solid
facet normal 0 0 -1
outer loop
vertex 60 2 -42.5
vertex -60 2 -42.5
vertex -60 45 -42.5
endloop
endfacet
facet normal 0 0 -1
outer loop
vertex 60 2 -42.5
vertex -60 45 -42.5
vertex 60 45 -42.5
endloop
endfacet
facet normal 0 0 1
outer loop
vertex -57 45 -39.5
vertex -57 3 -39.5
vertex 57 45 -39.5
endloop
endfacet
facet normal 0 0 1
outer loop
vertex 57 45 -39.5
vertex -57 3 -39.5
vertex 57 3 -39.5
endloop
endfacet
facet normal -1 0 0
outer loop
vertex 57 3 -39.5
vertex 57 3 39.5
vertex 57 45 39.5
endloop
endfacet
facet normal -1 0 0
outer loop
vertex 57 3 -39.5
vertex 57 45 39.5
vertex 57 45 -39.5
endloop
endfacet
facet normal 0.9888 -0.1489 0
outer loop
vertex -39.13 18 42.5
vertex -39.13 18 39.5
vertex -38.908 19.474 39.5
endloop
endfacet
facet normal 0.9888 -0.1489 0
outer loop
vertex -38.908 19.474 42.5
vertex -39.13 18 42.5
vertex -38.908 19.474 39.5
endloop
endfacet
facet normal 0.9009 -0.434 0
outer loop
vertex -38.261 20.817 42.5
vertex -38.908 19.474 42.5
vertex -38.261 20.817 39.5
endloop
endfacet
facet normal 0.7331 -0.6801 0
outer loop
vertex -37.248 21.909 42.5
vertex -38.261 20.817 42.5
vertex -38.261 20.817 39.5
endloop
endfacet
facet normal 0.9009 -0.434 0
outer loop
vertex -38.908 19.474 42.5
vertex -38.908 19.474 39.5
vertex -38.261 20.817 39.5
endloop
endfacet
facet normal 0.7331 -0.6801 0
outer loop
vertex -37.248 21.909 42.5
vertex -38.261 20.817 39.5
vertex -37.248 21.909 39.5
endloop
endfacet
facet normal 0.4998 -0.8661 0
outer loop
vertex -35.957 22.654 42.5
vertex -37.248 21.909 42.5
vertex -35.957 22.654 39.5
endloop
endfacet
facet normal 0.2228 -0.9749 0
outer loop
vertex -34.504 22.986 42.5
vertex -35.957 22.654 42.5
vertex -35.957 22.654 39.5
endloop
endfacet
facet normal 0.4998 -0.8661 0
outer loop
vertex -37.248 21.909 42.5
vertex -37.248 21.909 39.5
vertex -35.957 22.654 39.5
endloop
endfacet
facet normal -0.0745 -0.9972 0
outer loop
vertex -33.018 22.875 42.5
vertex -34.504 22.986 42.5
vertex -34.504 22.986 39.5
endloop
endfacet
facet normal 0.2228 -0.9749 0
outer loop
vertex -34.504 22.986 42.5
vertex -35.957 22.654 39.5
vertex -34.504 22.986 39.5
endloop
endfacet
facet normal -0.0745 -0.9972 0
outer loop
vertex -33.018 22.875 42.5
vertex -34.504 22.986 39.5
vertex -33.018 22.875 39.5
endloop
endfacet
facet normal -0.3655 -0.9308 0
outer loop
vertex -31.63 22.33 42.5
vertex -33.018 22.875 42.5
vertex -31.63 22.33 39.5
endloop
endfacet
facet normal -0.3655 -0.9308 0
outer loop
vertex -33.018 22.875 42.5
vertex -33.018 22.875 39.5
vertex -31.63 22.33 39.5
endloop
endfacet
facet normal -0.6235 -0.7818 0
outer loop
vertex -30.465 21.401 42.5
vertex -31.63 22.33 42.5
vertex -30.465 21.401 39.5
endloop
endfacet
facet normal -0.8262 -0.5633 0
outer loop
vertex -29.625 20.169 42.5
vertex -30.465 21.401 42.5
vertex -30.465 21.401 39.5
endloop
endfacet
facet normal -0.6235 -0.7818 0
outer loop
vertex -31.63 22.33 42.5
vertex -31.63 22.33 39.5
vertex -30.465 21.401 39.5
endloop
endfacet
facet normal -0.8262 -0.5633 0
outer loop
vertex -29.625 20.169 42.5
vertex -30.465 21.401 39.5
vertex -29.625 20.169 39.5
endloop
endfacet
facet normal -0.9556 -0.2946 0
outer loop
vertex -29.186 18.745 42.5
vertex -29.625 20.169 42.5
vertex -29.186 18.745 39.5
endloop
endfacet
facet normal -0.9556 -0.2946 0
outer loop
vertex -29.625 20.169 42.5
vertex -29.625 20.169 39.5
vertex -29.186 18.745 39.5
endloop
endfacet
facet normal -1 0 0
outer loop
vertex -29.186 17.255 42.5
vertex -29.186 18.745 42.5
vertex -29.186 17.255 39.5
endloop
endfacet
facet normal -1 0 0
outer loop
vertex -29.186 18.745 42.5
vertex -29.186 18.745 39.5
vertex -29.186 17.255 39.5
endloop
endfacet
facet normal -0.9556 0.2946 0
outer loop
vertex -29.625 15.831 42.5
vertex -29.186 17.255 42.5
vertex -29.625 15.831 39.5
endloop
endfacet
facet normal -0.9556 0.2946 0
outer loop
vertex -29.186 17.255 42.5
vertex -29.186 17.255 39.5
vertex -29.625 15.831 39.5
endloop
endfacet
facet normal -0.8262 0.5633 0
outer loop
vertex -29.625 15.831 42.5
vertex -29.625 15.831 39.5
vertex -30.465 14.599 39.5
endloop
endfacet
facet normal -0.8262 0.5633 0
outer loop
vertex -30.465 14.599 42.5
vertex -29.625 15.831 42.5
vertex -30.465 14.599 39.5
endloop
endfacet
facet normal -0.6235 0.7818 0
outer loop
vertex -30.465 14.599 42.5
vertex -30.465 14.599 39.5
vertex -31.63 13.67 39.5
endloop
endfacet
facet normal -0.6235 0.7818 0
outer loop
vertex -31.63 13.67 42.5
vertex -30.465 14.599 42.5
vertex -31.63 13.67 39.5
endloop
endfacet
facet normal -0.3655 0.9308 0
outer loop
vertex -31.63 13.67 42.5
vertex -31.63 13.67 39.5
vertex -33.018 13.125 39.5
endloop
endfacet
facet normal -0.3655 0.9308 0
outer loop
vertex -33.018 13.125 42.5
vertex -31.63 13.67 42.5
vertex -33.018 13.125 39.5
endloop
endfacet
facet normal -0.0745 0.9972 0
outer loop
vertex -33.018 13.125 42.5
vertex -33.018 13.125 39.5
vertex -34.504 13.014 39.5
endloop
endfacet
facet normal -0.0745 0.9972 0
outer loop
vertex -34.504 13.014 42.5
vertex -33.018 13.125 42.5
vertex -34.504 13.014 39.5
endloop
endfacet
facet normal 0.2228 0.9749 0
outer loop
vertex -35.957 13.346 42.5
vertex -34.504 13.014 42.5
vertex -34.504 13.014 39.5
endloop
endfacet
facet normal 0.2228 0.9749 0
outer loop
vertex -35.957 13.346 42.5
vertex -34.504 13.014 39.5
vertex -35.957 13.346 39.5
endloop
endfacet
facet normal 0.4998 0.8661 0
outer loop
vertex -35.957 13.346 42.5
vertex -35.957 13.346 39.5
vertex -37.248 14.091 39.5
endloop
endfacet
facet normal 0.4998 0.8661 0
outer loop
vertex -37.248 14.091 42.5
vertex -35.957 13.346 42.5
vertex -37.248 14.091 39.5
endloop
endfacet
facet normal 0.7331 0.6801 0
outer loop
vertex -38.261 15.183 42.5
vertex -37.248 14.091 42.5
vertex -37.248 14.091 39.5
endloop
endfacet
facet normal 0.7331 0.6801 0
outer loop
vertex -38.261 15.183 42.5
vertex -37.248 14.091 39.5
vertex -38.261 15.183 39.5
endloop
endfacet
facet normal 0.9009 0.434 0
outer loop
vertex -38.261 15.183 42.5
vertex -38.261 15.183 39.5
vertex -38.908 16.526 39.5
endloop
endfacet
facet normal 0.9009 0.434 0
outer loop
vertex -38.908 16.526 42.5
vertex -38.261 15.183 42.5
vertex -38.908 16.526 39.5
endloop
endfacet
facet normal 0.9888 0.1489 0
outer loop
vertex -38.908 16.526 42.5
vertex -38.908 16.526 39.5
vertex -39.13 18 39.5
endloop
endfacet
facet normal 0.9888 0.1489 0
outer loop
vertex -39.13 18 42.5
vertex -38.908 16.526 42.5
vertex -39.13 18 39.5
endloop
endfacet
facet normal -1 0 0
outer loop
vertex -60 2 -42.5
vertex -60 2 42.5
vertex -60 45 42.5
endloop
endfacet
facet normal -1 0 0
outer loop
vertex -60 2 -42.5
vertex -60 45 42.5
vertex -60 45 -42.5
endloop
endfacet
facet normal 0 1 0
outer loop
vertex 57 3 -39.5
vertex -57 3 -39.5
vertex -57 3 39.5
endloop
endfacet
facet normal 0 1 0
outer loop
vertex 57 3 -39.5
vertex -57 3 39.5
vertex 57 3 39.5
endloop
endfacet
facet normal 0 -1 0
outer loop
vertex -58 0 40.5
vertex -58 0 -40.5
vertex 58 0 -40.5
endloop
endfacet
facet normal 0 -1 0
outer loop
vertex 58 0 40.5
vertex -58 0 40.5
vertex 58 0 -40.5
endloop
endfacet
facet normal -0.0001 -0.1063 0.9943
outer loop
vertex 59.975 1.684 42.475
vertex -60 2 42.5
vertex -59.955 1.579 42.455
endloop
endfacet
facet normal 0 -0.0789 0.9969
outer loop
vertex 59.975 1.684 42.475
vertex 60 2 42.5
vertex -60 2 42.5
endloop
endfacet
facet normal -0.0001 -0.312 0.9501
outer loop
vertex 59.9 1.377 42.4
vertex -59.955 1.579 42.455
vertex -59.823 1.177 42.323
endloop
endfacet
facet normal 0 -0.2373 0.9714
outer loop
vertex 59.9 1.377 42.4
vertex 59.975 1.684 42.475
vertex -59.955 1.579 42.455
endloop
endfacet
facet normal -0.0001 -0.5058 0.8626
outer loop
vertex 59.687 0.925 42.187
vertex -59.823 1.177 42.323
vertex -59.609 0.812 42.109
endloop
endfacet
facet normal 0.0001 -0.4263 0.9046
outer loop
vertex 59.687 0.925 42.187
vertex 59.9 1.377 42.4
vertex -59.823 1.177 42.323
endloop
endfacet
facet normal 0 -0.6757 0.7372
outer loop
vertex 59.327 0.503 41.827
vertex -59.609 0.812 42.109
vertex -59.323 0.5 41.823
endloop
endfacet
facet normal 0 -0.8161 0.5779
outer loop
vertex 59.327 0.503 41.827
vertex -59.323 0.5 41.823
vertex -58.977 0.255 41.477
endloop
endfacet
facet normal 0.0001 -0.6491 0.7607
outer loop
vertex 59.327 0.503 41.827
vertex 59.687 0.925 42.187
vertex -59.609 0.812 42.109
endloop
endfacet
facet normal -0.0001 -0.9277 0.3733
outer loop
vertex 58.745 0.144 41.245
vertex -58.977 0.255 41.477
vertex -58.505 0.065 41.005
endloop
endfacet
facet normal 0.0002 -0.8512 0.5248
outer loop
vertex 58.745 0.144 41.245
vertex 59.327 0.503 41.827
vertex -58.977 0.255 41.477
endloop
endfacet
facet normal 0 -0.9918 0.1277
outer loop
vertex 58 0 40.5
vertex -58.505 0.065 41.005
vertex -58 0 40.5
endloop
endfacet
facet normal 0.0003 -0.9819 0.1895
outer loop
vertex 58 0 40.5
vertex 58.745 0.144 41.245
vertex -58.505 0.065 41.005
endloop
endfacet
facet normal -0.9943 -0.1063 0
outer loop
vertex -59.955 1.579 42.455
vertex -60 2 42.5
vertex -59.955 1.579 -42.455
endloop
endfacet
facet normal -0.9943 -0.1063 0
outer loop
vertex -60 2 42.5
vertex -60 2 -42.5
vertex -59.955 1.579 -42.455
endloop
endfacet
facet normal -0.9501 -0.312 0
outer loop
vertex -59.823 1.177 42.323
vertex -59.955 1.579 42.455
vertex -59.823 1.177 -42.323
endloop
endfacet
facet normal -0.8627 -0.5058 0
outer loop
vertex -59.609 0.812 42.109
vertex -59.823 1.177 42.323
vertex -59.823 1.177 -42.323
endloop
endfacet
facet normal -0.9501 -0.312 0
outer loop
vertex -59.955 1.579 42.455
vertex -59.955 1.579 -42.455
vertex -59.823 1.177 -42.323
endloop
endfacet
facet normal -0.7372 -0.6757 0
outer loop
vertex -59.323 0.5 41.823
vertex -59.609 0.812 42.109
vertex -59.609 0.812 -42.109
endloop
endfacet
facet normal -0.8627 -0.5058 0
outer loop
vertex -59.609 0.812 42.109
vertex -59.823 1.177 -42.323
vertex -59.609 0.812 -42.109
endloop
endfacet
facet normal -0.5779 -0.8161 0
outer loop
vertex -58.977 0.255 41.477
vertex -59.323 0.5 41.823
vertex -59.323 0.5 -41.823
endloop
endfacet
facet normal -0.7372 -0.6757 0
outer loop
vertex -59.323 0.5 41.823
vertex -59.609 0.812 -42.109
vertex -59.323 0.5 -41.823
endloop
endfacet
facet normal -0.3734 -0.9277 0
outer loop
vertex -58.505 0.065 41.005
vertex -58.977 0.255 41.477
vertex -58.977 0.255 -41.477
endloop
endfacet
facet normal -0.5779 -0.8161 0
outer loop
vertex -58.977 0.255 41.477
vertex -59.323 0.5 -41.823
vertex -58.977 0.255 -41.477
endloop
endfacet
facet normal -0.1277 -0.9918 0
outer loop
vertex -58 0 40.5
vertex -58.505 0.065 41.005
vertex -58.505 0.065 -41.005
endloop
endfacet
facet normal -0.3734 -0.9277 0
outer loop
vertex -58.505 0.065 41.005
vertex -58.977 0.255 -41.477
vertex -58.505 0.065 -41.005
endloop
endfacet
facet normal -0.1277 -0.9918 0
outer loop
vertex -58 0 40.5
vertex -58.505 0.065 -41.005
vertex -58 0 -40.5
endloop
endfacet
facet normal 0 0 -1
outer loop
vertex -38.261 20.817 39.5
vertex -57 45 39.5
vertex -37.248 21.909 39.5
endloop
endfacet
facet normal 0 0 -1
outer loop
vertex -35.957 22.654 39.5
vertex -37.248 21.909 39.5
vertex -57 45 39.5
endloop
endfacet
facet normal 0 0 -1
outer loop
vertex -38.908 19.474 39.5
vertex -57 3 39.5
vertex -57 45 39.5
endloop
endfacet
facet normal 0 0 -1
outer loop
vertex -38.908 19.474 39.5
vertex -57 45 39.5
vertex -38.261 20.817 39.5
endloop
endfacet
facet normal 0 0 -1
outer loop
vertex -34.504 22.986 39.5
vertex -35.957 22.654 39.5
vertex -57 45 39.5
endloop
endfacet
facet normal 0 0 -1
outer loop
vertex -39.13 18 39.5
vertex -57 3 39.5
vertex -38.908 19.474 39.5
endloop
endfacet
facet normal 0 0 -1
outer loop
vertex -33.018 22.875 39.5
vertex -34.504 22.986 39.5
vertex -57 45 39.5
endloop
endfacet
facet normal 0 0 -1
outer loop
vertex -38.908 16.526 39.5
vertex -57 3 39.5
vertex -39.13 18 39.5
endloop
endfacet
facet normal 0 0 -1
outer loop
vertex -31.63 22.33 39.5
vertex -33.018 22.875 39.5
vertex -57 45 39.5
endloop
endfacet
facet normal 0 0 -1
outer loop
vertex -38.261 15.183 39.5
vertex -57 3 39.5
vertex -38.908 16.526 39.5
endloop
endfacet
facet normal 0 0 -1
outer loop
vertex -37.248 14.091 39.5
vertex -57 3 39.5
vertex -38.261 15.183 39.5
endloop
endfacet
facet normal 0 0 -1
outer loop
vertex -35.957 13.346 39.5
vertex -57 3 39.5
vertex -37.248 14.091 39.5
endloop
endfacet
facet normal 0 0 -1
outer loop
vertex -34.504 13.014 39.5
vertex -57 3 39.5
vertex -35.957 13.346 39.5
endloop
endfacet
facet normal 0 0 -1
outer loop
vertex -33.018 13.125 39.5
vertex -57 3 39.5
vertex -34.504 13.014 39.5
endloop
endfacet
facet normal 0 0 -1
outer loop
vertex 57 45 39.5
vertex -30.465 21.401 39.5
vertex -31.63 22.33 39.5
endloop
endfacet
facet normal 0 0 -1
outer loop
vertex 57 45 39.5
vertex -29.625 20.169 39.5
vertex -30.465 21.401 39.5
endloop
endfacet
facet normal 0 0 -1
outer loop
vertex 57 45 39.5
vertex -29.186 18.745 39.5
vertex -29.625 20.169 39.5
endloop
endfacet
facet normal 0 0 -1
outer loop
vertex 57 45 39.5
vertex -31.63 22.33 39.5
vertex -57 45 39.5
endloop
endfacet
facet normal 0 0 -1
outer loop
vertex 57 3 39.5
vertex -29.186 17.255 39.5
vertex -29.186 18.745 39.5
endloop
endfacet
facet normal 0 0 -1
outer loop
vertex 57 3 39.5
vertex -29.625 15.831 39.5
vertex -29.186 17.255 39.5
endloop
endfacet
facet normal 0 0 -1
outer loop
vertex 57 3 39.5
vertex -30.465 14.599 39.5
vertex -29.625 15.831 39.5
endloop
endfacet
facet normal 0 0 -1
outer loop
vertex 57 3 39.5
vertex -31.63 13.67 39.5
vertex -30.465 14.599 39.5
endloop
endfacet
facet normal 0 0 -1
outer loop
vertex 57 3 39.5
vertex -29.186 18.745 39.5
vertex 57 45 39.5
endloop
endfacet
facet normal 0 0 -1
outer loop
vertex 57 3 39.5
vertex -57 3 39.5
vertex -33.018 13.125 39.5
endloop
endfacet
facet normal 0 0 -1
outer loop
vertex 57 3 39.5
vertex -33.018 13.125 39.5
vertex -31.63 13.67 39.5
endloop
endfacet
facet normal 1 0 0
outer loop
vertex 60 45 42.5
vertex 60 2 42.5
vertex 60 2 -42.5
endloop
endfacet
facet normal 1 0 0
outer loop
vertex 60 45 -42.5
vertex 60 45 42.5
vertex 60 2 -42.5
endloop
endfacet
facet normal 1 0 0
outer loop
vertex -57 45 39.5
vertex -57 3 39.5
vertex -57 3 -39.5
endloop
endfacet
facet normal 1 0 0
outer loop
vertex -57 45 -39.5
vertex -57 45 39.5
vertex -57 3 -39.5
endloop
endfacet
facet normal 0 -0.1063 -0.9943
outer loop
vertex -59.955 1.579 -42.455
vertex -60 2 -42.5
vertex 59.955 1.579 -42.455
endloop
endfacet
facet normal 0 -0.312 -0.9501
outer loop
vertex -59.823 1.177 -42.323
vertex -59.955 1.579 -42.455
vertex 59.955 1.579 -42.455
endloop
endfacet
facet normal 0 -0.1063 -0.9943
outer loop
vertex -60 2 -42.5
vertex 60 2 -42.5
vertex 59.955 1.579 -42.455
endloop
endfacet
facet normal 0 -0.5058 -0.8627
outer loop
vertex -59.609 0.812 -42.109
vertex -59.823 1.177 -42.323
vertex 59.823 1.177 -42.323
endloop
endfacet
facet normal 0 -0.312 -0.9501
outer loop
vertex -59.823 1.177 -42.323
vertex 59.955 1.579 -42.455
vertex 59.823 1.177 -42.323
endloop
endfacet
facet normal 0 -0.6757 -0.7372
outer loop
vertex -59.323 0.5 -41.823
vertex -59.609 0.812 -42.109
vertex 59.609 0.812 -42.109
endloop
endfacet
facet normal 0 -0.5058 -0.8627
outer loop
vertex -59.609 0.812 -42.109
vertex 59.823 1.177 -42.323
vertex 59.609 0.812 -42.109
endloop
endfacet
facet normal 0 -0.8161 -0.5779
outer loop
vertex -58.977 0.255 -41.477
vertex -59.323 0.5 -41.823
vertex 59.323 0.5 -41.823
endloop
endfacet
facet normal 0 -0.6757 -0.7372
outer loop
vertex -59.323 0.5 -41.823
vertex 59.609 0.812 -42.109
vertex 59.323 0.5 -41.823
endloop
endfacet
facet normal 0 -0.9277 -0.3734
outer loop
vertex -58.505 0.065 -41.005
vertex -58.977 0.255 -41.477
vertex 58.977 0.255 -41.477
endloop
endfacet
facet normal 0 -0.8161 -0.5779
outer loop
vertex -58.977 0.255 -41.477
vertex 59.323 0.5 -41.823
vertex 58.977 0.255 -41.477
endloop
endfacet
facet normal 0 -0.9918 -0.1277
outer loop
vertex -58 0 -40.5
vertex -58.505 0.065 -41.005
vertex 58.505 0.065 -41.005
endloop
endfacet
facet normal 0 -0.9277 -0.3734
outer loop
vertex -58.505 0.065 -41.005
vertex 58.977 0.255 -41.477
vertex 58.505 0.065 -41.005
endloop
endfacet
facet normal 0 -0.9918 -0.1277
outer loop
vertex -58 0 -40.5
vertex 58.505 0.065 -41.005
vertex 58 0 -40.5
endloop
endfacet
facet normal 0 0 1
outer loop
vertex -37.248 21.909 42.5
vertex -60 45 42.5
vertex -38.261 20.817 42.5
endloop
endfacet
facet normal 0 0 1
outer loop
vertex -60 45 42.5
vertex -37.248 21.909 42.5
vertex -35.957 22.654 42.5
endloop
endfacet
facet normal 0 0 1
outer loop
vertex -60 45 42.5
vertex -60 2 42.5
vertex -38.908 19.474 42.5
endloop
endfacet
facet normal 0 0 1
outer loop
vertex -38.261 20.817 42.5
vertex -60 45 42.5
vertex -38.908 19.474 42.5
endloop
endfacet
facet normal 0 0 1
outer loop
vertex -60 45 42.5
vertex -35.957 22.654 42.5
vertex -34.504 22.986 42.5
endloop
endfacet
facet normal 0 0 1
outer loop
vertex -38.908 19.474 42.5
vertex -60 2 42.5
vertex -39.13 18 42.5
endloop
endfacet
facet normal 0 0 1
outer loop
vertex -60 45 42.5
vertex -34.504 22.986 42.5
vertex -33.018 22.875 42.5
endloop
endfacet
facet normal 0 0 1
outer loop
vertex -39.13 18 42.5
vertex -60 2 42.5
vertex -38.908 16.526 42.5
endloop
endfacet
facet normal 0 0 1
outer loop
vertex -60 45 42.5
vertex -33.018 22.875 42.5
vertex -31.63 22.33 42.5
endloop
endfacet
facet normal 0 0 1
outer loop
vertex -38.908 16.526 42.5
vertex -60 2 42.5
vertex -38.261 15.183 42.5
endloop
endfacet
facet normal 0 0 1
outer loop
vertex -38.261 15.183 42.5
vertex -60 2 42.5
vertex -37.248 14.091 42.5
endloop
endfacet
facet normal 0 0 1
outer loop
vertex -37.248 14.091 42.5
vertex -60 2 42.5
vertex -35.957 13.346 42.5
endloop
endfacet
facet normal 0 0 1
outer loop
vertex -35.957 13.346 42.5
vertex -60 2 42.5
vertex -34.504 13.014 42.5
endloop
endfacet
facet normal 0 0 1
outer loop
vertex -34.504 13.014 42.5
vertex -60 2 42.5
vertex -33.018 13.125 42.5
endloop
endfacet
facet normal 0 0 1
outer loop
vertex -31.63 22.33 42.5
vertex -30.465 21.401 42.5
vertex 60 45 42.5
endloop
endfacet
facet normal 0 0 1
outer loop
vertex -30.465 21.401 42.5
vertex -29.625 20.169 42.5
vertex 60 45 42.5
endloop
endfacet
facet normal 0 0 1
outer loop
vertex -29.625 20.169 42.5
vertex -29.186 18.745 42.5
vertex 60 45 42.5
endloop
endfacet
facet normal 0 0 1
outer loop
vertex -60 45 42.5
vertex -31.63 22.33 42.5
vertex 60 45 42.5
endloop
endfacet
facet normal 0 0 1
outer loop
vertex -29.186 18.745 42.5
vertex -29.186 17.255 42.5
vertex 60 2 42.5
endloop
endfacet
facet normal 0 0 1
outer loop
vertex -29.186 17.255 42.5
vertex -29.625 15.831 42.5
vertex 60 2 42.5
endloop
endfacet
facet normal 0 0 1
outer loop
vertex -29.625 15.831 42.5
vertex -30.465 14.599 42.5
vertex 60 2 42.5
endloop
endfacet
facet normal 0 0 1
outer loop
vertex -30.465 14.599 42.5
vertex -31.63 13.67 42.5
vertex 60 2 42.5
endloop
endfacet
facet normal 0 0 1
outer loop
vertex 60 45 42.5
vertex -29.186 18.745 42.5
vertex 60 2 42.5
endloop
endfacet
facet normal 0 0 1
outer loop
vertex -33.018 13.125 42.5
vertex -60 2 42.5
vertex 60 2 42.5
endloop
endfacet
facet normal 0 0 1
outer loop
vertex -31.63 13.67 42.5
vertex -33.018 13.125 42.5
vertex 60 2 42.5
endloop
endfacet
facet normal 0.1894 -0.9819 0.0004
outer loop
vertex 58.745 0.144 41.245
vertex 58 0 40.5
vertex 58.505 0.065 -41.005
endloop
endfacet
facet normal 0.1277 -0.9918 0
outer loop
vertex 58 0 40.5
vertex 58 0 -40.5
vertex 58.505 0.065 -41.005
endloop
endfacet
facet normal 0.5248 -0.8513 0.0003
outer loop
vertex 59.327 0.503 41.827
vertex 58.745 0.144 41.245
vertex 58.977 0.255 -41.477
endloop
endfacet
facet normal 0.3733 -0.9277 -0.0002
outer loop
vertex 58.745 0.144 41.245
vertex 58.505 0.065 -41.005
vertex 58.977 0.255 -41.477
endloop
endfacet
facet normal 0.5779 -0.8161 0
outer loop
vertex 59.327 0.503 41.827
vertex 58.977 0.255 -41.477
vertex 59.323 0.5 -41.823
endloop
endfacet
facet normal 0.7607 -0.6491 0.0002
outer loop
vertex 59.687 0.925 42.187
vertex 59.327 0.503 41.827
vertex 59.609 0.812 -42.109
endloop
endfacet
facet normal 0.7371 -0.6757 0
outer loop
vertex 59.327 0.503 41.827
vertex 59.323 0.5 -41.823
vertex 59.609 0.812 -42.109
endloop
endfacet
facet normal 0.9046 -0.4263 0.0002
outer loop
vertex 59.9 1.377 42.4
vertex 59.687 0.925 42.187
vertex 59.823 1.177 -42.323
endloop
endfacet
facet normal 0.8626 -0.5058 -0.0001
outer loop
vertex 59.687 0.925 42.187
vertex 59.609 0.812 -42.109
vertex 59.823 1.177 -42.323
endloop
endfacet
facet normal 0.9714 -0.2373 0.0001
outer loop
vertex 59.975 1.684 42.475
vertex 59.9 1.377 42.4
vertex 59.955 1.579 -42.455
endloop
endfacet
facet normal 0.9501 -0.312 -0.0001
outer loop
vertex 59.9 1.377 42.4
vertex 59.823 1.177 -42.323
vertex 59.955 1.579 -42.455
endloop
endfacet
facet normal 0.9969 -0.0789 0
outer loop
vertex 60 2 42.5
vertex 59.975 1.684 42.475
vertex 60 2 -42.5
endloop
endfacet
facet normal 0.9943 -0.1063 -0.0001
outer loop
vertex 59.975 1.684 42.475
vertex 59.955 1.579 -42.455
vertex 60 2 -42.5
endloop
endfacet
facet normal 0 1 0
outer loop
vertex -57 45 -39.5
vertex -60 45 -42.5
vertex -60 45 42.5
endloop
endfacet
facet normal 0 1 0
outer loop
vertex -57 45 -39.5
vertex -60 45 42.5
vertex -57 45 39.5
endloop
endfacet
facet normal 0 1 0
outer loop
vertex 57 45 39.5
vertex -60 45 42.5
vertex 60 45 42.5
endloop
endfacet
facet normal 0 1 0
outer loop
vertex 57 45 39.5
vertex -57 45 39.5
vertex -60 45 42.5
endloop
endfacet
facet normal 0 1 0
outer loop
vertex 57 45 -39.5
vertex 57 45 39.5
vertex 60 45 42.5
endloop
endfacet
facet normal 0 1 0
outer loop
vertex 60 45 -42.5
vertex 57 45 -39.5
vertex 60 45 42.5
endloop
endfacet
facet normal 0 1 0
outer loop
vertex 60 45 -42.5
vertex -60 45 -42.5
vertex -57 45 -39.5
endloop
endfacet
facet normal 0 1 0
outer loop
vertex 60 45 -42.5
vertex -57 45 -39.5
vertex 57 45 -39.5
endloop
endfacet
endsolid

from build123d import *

# Parameters (mm, degrees)
SKETCH1_W           = 120
SKETCH1_H           = 85
BOSS_EXTRUDE1_DEPTH = 45
SHELL1_T            = -3
SKETCH5_R           = 5
CUT_EXTRUDE2_DEPTH  = 45
FILLET1_R           = 2


with BuildPart() as part:
    # Sketch1 → Boss-Extrude1 (new body)
    with BuildSketch(Plane(origin=(0, 0, 0), x_dir=(1, 0, 0), z_dir=(0, 1, 0))):
        Rectangle(SKETCH1_W, SKETCH1_H)
    extrude(amount=BOSS_EXTRUDE1_DEPTH)

    # Shell1
    shell1_openings = [part.faces().sort_by_distance(p)[0] for p in [
        (0, 45, 0),
    ]]
    offset(amount=SHELL1_T, openings=shell1_openings, kind=Kind.INTERSECTION)

    # Sketch5 → Cut-Extrude2 (cut)
    with BuildSketch(Plane(origin=(0, 0, 39.5), x_dir=(-1, 0, 0), z_dir=(0, 0, -1))):
        with Locations((34.130287034, 18)):
            Circle(SKETCH5_R)
    extrude(amount=-CUT_EXTRUDE2_DEPTH, mode=Mode.SUBTRACT)

    # Fillet1
    fillet1_edges = [part.edges().sort_by_distance(p)[0] for p in [
        (0, 0, -42.5),
        (60, 0, 0),
        (0, 0, 42.5),
        (-60, 0, 0),
    ]]
    fillet(fillet1_edges, radius=FILLET1_R)


solid = part.part
